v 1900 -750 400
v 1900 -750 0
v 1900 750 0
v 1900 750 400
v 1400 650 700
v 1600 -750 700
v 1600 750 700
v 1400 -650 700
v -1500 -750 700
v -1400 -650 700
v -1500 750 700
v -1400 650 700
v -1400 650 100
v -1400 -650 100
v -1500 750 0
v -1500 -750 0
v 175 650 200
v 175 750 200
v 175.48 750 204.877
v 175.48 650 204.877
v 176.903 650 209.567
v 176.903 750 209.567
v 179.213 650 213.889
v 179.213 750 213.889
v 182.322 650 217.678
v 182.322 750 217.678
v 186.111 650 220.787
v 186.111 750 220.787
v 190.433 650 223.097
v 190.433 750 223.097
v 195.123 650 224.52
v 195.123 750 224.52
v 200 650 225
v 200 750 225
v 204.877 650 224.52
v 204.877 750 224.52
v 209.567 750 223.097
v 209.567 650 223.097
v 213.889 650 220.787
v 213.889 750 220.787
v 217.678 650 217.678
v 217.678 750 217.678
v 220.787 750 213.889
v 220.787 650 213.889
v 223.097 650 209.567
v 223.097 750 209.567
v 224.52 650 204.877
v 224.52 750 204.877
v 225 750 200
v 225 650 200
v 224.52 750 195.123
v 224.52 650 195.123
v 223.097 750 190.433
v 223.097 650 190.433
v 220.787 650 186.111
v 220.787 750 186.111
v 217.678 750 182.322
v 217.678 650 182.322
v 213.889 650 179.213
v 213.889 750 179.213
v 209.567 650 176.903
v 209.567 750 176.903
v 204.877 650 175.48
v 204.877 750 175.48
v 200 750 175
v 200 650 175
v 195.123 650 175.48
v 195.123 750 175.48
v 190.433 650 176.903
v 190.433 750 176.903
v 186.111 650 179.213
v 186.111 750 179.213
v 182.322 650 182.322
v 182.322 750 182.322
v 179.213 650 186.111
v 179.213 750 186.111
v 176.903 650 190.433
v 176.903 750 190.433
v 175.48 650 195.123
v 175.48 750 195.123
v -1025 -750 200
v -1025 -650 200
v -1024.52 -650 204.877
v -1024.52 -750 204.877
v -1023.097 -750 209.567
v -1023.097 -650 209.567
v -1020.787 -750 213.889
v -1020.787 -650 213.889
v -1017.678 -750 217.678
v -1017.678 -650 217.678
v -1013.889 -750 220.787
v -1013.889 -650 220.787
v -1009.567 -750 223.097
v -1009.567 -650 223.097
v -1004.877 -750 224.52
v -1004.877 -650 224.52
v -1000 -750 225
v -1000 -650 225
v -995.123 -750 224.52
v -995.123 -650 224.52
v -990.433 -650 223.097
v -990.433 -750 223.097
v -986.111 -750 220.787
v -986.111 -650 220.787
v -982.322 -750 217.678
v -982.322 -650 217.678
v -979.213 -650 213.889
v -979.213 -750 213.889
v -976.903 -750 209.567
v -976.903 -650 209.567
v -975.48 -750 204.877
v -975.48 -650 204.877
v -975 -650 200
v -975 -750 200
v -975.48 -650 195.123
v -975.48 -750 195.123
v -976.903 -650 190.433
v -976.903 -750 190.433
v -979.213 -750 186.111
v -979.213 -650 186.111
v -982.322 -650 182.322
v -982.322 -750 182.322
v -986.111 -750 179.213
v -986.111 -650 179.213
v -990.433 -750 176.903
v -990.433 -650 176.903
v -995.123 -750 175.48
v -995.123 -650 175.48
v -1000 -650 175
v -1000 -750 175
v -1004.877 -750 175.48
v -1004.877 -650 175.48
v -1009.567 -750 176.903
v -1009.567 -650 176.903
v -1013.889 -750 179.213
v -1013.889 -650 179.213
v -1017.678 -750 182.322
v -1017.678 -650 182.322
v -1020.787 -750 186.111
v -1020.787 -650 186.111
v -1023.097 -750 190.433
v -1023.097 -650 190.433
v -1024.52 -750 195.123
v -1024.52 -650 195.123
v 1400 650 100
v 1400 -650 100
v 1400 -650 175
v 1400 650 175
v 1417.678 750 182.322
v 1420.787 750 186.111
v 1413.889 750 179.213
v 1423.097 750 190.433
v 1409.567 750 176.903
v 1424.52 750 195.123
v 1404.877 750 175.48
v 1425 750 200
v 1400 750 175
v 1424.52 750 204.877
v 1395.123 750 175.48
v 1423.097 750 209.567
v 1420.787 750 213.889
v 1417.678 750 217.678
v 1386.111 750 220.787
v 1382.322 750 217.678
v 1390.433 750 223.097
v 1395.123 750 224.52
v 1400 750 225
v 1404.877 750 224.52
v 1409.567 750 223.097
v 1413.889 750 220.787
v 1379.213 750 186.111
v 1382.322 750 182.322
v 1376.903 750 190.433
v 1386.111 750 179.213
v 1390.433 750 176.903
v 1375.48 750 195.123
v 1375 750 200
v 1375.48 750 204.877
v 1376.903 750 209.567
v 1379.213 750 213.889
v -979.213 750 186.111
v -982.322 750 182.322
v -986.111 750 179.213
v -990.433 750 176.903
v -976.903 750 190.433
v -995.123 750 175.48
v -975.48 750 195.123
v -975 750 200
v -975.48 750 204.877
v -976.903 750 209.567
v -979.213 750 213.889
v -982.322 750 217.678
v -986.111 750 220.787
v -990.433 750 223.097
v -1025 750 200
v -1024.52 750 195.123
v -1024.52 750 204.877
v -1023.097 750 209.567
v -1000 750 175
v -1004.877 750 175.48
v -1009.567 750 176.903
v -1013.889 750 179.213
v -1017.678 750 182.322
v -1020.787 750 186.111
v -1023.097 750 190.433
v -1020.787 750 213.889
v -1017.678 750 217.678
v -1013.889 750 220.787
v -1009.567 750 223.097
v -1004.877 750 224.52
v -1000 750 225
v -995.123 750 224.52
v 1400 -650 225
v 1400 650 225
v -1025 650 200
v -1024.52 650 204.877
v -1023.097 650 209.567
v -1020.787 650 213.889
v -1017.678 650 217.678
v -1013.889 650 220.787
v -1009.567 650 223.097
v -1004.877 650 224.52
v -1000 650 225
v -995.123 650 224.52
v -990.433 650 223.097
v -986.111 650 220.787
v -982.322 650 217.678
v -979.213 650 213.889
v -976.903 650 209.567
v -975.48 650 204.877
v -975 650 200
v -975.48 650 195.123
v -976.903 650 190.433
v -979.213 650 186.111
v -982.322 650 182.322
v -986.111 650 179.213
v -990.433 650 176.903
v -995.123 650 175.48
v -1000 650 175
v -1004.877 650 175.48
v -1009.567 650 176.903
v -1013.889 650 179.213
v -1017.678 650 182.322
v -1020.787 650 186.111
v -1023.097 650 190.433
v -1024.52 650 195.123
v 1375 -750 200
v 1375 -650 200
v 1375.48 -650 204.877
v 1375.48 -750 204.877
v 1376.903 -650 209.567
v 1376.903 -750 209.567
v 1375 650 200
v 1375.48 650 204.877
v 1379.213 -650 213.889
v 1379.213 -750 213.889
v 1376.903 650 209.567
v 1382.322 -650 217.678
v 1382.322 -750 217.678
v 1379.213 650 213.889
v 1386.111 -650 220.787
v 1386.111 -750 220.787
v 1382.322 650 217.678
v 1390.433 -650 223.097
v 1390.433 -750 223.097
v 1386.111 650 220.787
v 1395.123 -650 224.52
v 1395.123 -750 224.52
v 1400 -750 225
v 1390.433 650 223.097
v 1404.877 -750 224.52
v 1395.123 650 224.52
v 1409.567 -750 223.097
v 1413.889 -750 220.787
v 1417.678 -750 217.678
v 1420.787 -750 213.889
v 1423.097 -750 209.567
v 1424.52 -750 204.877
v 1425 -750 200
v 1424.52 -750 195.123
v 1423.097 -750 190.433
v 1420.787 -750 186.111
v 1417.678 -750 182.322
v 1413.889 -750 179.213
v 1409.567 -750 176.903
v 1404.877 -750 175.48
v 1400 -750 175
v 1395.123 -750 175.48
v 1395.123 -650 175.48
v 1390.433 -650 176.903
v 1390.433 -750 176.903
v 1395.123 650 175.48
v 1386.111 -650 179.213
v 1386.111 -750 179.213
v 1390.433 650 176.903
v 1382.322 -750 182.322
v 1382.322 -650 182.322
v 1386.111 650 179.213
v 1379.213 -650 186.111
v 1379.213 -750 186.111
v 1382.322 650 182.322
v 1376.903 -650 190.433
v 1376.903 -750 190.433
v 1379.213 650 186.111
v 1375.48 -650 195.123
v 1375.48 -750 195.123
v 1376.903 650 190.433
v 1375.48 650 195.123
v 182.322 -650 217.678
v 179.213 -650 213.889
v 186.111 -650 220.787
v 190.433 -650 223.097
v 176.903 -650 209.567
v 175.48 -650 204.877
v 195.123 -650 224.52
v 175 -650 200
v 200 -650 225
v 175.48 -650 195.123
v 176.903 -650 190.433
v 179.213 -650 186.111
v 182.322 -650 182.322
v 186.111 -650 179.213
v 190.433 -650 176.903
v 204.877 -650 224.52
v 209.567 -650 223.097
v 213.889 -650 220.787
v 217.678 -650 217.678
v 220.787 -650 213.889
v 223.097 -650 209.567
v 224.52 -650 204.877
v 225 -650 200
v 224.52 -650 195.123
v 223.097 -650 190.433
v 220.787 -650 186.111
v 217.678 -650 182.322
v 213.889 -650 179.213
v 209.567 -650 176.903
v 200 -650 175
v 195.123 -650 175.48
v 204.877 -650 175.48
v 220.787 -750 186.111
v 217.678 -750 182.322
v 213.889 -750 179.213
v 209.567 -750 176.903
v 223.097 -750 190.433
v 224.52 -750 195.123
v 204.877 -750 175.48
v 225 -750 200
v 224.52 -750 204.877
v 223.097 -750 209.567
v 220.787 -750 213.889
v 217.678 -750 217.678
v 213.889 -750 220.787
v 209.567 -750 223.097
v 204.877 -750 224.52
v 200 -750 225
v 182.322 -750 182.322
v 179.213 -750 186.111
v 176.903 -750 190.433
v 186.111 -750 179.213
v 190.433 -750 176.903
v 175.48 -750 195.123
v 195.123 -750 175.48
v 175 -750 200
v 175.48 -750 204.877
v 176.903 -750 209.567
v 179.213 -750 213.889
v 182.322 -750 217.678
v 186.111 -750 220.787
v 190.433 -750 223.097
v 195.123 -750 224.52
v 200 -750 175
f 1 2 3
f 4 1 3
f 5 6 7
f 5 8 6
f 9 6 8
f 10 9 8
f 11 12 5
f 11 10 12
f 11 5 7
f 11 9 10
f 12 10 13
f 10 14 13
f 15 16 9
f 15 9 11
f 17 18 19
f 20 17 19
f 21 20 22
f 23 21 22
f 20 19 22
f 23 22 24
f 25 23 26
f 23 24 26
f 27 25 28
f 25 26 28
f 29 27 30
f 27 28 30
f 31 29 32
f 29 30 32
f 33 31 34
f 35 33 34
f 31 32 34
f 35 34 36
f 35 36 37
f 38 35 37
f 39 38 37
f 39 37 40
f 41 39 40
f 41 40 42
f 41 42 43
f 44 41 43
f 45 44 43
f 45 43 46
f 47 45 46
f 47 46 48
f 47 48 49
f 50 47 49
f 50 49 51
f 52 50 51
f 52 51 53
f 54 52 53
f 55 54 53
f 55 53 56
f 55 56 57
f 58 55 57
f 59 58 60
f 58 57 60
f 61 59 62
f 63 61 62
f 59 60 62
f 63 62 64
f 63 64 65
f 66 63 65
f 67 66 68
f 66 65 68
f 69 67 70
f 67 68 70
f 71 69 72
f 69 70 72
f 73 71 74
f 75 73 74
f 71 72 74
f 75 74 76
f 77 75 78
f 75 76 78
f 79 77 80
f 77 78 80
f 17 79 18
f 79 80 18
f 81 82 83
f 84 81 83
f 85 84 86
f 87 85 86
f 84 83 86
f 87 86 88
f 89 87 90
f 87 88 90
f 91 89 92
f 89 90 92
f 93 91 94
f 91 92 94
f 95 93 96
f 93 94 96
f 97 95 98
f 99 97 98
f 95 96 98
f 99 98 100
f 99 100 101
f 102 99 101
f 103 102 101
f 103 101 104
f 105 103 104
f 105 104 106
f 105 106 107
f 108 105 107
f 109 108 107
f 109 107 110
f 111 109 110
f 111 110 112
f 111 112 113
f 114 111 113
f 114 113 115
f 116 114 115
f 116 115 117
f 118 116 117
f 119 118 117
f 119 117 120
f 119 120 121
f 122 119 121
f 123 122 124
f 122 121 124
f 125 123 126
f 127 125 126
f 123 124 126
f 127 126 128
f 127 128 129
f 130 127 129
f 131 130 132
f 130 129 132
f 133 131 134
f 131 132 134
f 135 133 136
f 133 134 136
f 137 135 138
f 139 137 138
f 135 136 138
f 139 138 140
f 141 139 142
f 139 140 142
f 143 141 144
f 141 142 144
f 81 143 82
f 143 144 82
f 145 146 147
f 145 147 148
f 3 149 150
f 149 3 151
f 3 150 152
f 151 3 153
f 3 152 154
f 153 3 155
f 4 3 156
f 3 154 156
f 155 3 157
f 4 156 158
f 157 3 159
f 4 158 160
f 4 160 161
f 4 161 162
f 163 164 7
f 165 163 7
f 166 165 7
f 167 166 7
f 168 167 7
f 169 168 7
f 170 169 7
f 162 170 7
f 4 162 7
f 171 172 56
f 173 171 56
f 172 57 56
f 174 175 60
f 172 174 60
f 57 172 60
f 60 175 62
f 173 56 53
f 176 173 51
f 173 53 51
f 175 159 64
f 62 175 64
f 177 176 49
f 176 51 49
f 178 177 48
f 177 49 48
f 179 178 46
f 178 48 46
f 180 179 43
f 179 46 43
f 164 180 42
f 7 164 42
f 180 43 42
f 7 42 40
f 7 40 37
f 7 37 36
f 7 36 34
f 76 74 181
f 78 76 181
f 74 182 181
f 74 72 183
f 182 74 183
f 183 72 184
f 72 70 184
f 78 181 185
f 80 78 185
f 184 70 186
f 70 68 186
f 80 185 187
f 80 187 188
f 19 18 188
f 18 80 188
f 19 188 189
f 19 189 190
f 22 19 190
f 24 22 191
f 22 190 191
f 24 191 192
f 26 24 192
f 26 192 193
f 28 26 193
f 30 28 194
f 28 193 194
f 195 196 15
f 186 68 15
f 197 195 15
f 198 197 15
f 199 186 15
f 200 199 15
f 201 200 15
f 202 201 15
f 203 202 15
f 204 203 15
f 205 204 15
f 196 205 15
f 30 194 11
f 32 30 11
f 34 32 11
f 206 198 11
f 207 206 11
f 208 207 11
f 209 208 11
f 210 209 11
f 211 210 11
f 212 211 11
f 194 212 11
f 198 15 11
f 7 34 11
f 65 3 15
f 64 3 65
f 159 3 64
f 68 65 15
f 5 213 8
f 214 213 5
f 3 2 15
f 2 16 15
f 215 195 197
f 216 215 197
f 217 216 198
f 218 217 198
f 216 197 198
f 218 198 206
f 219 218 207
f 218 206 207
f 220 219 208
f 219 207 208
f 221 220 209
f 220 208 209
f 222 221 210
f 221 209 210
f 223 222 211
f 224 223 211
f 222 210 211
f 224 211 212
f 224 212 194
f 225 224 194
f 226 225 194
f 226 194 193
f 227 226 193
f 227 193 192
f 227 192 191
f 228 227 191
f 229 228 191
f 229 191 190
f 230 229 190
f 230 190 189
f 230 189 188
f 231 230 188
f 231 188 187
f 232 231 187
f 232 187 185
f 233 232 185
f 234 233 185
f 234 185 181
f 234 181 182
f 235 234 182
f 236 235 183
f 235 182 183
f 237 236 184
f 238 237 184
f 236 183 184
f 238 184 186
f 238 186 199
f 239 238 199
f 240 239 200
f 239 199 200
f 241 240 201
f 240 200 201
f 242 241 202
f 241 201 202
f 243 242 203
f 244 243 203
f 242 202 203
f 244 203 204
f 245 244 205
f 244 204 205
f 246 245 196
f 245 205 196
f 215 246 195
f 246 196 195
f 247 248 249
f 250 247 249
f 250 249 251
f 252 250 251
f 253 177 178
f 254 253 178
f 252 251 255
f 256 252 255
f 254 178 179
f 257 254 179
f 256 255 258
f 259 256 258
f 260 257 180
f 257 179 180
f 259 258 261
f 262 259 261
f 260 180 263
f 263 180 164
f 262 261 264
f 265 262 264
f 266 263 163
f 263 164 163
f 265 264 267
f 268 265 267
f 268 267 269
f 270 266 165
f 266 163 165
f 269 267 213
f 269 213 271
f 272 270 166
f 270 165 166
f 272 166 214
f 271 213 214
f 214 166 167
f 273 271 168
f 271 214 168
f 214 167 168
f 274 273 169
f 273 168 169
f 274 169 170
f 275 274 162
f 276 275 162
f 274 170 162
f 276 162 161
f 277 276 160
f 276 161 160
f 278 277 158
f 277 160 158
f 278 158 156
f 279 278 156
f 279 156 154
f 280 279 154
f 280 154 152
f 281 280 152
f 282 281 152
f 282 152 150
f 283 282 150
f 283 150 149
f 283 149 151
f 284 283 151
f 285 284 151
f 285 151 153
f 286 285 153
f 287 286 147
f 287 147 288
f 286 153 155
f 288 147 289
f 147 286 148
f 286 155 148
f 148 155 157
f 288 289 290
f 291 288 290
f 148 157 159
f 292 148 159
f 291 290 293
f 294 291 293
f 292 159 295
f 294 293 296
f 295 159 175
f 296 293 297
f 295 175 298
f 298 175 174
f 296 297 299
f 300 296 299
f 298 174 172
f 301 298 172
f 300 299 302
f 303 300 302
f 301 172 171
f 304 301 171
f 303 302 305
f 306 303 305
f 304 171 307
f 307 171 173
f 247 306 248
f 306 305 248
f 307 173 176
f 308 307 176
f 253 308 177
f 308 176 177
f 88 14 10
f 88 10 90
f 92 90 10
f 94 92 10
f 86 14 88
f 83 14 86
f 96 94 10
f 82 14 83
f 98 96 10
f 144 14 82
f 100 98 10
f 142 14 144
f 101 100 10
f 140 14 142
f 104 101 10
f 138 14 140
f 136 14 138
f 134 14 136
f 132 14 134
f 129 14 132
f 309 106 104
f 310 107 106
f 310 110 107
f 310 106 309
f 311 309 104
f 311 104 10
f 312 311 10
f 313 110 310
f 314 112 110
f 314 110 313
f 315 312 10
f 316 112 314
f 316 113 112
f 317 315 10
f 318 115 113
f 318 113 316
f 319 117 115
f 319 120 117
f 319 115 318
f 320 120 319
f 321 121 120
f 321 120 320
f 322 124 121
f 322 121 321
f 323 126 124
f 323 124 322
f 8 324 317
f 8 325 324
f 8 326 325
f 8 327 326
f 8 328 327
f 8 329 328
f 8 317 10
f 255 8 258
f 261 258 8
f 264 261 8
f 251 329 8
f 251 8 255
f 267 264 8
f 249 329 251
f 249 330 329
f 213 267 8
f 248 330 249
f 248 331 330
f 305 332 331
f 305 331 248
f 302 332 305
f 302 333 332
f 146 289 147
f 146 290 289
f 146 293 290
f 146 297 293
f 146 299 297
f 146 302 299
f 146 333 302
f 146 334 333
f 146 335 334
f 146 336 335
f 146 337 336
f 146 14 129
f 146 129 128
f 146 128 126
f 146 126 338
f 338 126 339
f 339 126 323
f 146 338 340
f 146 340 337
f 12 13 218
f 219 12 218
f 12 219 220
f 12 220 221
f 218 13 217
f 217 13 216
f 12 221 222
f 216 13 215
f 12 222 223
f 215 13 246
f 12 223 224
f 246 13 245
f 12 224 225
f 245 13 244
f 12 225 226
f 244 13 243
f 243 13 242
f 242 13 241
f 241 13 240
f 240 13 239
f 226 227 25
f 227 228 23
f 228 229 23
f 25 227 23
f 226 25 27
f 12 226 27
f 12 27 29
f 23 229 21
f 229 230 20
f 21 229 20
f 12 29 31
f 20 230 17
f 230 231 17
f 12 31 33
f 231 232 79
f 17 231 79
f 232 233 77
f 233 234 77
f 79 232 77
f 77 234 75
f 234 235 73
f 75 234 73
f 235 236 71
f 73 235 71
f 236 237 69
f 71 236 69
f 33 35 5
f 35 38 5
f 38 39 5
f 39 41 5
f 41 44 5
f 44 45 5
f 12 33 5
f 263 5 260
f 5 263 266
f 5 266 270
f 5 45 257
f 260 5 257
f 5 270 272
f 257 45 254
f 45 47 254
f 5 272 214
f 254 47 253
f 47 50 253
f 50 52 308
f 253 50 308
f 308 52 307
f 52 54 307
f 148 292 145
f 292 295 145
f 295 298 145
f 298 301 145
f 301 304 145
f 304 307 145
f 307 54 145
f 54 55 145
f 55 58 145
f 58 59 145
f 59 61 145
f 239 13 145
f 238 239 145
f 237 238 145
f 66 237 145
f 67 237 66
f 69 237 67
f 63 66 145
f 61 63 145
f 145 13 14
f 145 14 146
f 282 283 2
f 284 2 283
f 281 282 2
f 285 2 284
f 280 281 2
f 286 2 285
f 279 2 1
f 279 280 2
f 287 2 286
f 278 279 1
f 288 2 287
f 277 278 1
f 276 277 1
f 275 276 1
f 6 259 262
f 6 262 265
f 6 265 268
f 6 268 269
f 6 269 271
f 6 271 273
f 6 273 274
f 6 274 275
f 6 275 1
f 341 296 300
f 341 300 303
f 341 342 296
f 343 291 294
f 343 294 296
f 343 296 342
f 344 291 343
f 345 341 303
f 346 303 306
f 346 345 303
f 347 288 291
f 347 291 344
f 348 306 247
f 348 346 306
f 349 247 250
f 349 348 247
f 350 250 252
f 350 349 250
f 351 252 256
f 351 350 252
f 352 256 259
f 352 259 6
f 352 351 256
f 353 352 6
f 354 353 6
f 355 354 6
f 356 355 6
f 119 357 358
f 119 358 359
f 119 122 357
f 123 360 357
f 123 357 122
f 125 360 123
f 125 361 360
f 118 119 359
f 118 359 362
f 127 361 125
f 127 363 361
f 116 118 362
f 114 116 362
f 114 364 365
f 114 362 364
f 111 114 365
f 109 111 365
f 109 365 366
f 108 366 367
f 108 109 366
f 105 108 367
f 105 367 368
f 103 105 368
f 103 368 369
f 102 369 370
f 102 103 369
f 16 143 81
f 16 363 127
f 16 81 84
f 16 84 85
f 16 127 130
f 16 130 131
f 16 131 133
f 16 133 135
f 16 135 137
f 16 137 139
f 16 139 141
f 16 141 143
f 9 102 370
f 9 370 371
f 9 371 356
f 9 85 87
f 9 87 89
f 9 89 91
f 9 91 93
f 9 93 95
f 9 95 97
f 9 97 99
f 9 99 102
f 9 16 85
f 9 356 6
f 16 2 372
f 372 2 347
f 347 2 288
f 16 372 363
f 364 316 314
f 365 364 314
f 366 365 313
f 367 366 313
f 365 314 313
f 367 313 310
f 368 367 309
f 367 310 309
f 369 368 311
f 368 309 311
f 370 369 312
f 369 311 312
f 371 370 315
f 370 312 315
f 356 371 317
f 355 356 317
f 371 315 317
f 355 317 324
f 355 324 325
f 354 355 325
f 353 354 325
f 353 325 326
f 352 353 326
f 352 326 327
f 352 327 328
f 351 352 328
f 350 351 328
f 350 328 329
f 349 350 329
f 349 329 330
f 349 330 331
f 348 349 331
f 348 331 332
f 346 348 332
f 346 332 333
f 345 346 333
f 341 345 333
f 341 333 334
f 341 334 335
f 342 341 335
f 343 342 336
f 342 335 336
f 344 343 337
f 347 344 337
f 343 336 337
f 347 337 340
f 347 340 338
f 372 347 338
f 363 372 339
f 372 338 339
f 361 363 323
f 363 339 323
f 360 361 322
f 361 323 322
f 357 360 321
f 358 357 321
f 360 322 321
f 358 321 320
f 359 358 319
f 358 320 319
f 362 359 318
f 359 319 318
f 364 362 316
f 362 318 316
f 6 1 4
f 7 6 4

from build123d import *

# Parameters (mm, degrees)
F0_W     = 3000
F0_H     = 1500
F1_DEPTH = 700
F2_T     = -100
F3_DEPTH = 400
F4_SIZE  = 300
F6_D     = 50


with BuildPart() as f1:
    # F0 (on Top) → F1 (new body)
    with BuildSketch(Plane.XY):
        Rectangle(F0_W, F0_H)
    extrude(amount=F1_DEPTH)

    # F2
    f2_openings = [f1.faces().sort_by_distance(p)[0] for p in [
        (0, 0, 700),
    ]]
    offset(amount=F2_T, openings=f2_openings)

    # F3 (add): a face of the model
    f3_faces = [f1.faces().sort_by_distance(p)[0] for p in [
        (1500, 0, 350),
    ]]
    extrude(f3_faces, amount=F3_DEPTH)

    # F4
    f4_edges = [f1.edges().sort_by_distance(p)[0] for p in [
        (1900, 0, 700),
    ]]
    chamfer(f4_edges, length=F4_SIZE)

    # F6 (through all)
    with Locations(Plane.XZ.offset(750)):
        with Locations((200, 200), (-1000, 200), (1400, 200)):
            Hole(F6_D / 2)


solid = f1.part
